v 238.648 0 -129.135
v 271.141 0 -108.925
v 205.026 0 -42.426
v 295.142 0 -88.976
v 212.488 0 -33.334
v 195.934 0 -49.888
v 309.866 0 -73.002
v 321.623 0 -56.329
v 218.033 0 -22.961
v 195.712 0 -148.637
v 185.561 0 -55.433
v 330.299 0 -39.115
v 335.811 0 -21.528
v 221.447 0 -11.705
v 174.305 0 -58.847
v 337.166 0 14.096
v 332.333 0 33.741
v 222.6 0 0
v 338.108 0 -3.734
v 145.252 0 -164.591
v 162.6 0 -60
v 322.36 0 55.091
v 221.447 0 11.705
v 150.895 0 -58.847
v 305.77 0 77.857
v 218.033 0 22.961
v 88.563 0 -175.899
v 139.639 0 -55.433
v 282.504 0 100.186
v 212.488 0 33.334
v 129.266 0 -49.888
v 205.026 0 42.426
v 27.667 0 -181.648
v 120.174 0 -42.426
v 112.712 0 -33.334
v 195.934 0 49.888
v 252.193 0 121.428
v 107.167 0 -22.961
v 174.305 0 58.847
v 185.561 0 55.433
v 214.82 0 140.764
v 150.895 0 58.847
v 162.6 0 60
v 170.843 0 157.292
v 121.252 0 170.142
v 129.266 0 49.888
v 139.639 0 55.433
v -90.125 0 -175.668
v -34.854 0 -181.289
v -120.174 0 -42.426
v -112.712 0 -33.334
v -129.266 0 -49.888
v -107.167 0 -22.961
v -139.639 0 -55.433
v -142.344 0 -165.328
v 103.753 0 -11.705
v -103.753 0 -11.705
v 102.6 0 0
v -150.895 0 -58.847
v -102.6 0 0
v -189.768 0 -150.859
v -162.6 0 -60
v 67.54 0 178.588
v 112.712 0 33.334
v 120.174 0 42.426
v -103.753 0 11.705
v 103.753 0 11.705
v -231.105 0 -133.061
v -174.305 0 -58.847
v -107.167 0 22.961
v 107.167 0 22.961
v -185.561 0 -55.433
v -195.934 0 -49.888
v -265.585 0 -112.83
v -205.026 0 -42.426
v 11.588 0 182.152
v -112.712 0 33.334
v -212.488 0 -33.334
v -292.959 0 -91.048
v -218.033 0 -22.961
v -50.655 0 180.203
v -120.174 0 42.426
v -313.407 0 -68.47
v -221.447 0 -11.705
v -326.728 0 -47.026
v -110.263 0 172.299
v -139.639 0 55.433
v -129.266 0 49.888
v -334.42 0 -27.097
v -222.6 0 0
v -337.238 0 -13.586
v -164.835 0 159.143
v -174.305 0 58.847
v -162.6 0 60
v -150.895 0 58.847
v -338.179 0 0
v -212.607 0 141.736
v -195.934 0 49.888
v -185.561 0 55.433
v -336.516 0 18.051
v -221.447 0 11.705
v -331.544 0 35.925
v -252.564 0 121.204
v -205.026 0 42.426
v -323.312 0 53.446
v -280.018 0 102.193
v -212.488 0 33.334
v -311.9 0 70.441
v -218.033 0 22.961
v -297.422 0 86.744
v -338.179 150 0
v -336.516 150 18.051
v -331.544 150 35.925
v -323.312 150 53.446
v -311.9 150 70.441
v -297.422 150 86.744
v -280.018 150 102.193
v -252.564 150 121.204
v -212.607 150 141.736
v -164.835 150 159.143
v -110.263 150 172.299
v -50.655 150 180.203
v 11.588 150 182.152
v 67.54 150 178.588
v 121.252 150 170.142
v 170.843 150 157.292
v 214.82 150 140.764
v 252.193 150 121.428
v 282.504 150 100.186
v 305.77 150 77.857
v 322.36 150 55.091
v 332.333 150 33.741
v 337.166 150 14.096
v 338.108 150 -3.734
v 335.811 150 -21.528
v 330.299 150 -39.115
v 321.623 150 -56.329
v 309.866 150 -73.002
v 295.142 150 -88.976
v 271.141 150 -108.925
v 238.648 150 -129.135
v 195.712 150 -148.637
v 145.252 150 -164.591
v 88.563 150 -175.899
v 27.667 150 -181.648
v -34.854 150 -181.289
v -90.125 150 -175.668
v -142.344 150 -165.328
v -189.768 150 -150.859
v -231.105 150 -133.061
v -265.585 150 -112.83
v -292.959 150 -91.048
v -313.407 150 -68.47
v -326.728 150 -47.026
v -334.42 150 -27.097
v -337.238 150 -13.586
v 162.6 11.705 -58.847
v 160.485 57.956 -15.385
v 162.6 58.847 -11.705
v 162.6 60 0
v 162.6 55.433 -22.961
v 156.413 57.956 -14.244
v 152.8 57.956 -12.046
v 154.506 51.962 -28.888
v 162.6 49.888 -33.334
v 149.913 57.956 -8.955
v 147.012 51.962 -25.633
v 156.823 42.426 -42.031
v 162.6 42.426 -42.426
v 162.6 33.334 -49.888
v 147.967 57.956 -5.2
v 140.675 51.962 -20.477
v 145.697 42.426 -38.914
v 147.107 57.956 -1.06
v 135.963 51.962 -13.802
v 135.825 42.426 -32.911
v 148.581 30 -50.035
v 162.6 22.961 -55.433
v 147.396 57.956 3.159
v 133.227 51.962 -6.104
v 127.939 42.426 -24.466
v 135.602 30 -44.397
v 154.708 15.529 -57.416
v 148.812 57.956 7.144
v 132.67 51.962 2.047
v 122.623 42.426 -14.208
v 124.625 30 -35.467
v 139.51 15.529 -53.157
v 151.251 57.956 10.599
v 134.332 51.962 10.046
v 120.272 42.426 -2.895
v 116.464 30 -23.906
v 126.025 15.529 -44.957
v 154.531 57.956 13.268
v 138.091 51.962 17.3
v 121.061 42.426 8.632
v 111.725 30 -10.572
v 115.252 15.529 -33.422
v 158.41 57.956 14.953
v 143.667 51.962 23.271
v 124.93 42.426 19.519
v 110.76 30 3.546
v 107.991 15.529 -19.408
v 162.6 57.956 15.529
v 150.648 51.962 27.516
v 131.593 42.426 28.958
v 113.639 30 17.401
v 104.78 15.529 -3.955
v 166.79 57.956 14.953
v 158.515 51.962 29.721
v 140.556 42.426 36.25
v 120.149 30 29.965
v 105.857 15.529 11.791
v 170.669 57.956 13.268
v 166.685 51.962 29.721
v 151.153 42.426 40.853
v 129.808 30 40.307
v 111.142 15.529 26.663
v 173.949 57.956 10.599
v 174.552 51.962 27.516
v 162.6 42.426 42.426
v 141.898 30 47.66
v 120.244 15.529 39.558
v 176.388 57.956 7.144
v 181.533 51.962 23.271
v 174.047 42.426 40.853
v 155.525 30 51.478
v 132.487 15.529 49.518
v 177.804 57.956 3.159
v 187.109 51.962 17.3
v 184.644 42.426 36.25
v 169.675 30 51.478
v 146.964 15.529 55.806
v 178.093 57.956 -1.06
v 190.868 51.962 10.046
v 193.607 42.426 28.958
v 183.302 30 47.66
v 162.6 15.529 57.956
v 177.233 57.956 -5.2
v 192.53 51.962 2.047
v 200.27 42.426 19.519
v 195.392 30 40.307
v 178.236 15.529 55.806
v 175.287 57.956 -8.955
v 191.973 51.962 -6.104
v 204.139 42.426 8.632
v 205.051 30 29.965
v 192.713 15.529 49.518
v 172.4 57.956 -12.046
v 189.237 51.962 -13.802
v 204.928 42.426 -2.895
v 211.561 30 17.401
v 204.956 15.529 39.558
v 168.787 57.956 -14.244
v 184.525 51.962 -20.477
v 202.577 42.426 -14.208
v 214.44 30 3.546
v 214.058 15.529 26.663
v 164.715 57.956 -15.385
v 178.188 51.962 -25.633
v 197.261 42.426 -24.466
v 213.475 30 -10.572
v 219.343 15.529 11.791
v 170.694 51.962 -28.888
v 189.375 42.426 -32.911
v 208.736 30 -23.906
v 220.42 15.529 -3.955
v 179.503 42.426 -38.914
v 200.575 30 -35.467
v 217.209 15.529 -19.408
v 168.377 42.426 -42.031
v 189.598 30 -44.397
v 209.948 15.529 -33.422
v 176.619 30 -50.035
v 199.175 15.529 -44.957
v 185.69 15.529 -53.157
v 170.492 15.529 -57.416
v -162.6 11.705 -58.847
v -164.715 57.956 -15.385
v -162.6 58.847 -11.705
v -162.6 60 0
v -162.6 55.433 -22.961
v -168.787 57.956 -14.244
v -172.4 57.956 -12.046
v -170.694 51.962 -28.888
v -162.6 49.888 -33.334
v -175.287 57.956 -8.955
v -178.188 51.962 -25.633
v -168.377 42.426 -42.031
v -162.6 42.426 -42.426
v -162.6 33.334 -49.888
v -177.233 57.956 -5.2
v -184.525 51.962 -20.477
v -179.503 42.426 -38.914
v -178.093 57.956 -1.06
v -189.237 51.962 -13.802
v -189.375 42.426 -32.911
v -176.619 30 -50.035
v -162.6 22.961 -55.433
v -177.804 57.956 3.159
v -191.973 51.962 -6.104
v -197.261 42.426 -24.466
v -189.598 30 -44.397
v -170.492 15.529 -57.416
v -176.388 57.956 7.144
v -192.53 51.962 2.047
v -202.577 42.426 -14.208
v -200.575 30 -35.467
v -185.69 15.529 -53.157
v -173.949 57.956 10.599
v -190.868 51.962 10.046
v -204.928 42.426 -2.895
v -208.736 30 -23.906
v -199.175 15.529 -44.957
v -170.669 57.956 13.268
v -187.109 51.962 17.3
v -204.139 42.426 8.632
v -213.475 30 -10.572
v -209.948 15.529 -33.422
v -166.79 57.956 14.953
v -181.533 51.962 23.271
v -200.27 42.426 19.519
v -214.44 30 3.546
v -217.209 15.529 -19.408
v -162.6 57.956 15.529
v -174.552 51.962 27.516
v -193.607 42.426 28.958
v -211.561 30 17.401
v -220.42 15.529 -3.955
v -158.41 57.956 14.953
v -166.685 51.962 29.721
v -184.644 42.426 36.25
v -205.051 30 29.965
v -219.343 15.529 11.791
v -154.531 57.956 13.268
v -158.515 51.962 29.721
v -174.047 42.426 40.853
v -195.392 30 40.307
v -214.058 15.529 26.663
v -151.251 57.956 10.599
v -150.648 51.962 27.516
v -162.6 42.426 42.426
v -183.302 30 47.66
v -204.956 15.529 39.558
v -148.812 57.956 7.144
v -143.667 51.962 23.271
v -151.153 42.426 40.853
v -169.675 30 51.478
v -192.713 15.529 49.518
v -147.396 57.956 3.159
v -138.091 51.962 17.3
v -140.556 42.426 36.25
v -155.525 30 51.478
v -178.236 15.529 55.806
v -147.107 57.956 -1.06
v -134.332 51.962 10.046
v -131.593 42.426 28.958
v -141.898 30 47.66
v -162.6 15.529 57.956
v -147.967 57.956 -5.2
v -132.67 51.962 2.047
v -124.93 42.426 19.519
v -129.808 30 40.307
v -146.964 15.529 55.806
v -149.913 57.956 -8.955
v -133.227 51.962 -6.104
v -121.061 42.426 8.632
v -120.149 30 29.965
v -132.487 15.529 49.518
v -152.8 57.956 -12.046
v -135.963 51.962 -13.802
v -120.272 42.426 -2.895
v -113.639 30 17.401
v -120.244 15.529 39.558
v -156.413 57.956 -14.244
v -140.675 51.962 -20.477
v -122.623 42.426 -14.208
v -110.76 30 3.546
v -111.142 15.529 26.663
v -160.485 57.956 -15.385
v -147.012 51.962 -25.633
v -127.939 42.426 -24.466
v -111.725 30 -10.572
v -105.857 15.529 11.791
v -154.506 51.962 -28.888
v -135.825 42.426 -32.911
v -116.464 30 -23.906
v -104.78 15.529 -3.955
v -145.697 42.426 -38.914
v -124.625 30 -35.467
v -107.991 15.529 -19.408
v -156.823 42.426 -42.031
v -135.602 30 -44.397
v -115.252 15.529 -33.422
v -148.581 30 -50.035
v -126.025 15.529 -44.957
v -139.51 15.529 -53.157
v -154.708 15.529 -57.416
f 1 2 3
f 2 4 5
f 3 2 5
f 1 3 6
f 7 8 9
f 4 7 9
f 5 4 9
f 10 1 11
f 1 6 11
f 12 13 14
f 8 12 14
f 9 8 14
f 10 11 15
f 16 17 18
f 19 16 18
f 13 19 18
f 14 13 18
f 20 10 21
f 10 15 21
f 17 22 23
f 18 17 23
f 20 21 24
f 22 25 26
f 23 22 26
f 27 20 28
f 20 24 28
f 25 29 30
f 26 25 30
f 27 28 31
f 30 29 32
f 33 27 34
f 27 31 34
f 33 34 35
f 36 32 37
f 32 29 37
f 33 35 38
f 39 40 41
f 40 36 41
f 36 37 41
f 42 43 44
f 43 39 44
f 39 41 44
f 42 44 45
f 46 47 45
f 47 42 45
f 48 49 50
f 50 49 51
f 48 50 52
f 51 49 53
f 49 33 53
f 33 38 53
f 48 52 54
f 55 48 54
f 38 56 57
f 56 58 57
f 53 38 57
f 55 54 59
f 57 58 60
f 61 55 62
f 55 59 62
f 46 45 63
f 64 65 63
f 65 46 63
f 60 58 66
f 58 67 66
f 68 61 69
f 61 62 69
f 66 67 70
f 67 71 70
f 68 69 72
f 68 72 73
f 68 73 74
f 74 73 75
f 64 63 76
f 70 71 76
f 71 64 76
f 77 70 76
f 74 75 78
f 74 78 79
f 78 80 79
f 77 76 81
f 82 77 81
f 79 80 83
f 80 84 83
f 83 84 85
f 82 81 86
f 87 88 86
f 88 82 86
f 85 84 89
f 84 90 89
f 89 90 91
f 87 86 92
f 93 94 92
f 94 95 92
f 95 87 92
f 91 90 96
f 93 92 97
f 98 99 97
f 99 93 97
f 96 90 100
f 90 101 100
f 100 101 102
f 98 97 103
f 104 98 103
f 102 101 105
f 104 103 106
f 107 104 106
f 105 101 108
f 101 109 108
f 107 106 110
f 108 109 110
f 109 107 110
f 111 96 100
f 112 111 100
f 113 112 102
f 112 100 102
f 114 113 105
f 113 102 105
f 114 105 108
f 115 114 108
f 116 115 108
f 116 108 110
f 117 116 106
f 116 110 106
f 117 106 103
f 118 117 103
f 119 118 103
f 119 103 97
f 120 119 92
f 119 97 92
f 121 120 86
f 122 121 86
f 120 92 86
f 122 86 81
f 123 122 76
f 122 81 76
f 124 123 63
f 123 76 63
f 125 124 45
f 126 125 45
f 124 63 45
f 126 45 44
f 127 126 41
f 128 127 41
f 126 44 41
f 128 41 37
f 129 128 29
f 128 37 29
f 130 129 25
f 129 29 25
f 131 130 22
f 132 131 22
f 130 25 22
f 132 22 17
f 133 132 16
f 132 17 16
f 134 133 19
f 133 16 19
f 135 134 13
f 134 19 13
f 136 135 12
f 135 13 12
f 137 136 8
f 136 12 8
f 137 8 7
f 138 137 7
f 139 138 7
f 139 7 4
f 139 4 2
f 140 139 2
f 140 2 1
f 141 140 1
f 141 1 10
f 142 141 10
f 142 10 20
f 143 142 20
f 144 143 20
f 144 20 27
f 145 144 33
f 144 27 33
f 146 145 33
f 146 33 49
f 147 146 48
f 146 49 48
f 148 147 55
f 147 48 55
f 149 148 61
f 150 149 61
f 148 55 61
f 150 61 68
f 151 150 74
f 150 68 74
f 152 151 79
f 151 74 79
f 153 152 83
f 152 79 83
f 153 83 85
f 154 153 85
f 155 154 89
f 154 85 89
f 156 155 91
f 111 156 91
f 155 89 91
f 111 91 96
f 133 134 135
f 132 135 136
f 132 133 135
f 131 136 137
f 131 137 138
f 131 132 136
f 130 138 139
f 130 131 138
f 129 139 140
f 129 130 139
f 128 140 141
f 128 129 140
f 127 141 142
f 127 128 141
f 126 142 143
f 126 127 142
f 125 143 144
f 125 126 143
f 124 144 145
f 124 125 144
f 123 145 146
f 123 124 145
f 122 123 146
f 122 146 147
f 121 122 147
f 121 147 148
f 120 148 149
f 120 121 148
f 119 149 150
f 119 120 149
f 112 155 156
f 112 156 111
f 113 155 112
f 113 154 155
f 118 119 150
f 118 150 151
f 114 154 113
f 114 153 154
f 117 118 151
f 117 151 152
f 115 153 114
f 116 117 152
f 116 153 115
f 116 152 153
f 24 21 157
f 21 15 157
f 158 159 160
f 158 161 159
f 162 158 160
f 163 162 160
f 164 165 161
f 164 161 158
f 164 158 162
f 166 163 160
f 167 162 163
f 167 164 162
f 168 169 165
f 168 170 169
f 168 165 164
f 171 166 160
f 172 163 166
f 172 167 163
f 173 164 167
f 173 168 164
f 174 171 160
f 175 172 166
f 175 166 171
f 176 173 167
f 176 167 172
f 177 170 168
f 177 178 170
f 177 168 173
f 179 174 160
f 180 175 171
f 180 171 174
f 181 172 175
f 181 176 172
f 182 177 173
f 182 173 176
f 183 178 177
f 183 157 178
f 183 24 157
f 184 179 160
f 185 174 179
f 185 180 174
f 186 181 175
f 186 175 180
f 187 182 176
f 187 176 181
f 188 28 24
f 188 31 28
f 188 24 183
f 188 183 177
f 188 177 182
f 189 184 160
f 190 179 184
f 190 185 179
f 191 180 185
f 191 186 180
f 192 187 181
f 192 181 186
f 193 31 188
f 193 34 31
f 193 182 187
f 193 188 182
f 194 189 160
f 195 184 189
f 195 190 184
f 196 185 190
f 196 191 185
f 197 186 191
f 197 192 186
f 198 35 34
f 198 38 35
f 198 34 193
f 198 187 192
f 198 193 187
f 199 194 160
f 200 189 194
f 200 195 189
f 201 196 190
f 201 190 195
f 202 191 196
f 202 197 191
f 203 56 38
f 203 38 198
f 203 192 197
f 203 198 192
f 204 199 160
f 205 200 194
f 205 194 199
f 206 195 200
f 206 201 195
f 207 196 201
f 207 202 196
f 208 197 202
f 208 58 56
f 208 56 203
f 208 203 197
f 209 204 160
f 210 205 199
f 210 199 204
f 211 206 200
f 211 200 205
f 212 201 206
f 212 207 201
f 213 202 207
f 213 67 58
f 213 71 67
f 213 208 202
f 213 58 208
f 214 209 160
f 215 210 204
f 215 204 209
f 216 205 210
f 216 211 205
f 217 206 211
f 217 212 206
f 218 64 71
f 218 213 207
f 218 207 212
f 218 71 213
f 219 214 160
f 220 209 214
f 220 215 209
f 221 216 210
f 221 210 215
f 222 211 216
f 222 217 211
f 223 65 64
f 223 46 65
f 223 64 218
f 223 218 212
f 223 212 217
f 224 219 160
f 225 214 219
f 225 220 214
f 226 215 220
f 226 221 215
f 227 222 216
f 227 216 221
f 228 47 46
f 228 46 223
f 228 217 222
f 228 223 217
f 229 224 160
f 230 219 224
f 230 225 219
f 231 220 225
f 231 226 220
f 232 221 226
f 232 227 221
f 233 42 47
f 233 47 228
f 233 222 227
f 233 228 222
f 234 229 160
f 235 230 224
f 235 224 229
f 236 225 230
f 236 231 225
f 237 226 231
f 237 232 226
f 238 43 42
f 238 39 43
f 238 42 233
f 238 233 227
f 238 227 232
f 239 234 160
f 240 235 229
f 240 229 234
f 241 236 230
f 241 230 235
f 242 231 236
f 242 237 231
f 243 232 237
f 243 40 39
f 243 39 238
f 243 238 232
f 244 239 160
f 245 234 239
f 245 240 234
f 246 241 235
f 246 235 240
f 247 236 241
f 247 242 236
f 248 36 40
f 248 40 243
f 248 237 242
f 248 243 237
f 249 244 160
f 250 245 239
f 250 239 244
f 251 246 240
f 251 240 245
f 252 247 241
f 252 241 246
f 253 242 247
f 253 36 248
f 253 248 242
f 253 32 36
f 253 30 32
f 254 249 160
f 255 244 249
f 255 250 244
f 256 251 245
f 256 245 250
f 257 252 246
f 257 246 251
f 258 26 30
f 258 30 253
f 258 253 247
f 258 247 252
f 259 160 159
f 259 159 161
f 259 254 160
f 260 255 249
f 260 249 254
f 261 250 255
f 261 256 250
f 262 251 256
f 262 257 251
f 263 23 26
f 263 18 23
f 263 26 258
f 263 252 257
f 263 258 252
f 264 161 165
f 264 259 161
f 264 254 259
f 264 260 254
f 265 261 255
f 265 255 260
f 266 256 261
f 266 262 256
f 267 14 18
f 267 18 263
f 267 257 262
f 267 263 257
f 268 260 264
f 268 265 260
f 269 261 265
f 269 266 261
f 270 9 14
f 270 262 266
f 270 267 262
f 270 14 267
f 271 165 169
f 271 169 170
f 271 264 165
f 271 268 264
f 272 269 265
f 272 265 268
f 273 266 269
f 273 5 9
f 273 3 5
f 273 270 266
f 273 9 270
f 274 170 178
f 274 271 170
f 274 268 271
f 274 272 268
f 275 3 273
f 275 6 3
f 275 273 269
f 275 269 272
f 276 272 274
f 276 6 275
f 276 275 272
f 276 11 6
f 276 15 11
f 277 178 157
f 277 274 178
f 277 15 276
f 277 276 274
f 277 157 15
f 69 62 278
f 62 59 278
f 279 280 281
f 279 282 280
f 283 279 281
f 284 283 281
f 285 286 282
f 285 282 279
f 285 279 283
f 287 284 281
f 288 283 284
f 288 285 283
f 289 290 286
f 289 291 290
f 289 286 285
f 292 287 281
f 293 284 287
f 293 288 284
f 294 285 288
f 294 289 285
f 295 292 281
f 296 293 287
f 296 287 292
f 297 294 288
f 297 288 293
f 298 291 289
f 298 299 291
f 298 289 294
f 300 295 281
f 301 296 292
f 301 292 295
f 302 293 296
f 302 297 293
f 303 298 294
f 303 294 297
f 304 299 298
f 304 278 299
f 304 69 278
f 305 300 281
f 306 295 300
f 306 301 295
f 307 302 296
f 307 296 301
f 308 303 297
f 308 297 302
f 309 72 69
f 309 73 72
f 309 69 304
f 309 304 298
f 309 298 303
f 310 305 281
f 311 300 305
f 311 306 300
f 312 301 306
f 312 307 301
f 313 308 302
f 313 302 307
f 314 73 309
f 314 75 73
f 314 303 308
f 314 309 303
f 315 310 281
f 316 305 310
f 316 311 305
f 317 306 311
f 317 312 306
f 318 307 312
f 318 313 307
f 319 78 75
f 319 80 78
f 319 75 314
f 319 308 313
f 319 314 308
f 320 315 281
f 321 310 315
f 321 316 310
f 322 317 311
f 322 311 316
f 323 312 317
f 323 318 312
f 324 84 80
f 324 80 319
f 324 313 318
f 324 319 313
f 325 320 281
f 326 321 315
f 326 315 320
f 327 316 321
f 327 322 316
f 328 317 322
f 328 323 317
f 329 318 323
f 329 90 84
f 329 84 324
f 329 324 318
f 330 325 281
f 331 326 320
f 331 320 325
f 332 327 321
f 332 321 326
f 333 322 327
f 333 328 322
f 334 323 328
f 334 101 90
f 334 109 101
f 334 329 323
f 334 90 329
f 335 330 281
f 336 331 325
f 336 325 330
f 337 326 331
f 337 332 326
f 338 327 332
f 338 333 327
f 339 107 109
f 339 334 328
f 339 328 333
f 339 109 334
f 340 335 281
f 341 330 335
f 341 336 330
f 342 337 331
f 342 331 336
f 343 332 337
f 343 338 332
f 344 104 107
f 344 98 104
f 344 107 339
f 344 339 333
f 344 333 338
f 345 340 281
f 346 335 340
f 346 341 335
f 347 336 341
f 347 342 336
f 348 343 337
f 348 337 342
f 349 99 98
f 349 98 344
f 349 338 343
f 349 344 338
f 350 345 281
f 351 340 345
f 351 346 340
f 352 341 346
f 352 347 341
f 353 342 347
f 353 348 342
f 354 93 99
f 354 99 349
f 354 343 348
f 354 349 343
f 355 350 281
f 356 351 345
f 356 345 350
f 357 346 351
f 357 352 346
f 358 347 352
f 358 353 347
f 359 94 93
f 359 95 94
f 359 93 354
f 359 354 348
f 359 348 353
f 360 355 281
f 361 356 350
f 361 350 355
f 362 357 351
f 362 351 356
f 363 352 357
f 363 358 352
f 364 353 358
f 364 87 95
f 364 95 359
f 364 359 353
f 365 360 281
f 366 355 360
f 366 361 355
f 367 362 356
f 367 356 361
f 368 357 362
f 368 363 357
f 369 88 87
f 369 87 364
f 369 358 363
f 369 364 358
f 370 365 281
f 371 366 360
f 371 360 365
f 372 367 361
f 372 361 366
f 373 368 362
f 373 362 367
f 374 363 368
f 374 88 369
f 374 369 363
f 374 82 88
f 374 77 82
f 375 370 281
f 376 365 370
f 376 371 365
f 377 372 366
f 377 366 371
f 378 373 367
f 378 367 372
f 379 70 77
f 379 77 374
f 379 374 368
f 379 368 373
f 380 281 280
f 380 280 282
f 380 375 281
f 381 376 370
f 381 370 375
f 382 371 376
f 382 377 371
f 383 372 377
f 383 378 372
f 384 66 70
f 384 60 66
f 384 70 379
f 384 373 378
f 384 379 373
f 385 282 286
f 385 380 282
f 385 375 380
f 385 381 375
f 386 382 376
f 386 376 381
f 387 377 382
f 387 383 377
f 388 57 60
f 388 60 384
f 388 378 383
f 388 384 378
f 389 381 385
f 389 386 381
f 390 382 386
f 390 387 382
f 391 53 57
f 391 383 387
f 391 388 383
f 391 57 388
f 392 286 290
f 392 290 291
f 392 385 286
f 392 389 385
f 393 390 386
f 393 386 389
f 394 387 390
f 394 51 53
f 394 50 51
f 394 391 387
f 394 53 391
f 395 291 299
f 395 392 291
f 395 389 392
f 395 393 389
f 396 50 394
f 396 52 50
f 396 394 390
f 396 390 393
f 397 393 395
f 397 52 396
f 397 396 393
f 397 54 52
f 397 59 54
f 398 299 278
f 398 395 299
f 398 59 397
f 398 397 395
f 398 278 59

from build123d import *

# Parameters (mm, degrees)
SKETCH1_RX          = 338.178695974
SKETCH1_RY          = 182.259434312
BOSS_EXTRUDE1_DEPTH = 150


with BuildPart() as part:
    # Sketch1 → Boss-Extrude1 (new body)
    with BuildSketch(Plane(origin=(0, 0, 0), x_dir=(1, 0, 0), z_dir=(0, 1, 0))):
        with Locations(Location((0, 0), (0, 0, 180))):
            Ellipse(SKETCH1_RX, SKETCH1_RY)
    extrude(amount=BOSS_EXTRUDE1_DEPTH)

    # Sketch3 → Cut-Revolve2 (revolve, cut)
    with BuildSketch(Plane(origin=(162.6, 0, 0), x_dir=(0, 0, -1), z_dir=(1, 0, 0))):
        with BuildLine():
            Line((0, 0), (0, 60))
            ThreePointArc((0, 60), (42.426406871, 42.426406871), (60, 0))
            Line((60, 0), (0, 0))
        make_face()
    revolve(axis=Axis((162.6, 0, 0), (0, 1, 0)), mode=Mode.SUBTRACT)

    # Sketch5 → Cut-Revolve3 (revolve, cut)
    with BuildSketch(Plane(origin=(-162.6, 0, 0), x_dir=(0, 0, -1), z_dir=(1, 0, 0))):
        with BuildLine():
            Line((0, 0), (0, 60))
            ThreePointArc((0, 60), (42.426406871, 42.426406871), (60, 0))
            Line((60, 0), (0, 0))
        make_face()
    revolve(axis=Axis((-162.6, 0, 0), (0, 1, 0)), mode=Mode.SUBTRACT)


solid = part.part
